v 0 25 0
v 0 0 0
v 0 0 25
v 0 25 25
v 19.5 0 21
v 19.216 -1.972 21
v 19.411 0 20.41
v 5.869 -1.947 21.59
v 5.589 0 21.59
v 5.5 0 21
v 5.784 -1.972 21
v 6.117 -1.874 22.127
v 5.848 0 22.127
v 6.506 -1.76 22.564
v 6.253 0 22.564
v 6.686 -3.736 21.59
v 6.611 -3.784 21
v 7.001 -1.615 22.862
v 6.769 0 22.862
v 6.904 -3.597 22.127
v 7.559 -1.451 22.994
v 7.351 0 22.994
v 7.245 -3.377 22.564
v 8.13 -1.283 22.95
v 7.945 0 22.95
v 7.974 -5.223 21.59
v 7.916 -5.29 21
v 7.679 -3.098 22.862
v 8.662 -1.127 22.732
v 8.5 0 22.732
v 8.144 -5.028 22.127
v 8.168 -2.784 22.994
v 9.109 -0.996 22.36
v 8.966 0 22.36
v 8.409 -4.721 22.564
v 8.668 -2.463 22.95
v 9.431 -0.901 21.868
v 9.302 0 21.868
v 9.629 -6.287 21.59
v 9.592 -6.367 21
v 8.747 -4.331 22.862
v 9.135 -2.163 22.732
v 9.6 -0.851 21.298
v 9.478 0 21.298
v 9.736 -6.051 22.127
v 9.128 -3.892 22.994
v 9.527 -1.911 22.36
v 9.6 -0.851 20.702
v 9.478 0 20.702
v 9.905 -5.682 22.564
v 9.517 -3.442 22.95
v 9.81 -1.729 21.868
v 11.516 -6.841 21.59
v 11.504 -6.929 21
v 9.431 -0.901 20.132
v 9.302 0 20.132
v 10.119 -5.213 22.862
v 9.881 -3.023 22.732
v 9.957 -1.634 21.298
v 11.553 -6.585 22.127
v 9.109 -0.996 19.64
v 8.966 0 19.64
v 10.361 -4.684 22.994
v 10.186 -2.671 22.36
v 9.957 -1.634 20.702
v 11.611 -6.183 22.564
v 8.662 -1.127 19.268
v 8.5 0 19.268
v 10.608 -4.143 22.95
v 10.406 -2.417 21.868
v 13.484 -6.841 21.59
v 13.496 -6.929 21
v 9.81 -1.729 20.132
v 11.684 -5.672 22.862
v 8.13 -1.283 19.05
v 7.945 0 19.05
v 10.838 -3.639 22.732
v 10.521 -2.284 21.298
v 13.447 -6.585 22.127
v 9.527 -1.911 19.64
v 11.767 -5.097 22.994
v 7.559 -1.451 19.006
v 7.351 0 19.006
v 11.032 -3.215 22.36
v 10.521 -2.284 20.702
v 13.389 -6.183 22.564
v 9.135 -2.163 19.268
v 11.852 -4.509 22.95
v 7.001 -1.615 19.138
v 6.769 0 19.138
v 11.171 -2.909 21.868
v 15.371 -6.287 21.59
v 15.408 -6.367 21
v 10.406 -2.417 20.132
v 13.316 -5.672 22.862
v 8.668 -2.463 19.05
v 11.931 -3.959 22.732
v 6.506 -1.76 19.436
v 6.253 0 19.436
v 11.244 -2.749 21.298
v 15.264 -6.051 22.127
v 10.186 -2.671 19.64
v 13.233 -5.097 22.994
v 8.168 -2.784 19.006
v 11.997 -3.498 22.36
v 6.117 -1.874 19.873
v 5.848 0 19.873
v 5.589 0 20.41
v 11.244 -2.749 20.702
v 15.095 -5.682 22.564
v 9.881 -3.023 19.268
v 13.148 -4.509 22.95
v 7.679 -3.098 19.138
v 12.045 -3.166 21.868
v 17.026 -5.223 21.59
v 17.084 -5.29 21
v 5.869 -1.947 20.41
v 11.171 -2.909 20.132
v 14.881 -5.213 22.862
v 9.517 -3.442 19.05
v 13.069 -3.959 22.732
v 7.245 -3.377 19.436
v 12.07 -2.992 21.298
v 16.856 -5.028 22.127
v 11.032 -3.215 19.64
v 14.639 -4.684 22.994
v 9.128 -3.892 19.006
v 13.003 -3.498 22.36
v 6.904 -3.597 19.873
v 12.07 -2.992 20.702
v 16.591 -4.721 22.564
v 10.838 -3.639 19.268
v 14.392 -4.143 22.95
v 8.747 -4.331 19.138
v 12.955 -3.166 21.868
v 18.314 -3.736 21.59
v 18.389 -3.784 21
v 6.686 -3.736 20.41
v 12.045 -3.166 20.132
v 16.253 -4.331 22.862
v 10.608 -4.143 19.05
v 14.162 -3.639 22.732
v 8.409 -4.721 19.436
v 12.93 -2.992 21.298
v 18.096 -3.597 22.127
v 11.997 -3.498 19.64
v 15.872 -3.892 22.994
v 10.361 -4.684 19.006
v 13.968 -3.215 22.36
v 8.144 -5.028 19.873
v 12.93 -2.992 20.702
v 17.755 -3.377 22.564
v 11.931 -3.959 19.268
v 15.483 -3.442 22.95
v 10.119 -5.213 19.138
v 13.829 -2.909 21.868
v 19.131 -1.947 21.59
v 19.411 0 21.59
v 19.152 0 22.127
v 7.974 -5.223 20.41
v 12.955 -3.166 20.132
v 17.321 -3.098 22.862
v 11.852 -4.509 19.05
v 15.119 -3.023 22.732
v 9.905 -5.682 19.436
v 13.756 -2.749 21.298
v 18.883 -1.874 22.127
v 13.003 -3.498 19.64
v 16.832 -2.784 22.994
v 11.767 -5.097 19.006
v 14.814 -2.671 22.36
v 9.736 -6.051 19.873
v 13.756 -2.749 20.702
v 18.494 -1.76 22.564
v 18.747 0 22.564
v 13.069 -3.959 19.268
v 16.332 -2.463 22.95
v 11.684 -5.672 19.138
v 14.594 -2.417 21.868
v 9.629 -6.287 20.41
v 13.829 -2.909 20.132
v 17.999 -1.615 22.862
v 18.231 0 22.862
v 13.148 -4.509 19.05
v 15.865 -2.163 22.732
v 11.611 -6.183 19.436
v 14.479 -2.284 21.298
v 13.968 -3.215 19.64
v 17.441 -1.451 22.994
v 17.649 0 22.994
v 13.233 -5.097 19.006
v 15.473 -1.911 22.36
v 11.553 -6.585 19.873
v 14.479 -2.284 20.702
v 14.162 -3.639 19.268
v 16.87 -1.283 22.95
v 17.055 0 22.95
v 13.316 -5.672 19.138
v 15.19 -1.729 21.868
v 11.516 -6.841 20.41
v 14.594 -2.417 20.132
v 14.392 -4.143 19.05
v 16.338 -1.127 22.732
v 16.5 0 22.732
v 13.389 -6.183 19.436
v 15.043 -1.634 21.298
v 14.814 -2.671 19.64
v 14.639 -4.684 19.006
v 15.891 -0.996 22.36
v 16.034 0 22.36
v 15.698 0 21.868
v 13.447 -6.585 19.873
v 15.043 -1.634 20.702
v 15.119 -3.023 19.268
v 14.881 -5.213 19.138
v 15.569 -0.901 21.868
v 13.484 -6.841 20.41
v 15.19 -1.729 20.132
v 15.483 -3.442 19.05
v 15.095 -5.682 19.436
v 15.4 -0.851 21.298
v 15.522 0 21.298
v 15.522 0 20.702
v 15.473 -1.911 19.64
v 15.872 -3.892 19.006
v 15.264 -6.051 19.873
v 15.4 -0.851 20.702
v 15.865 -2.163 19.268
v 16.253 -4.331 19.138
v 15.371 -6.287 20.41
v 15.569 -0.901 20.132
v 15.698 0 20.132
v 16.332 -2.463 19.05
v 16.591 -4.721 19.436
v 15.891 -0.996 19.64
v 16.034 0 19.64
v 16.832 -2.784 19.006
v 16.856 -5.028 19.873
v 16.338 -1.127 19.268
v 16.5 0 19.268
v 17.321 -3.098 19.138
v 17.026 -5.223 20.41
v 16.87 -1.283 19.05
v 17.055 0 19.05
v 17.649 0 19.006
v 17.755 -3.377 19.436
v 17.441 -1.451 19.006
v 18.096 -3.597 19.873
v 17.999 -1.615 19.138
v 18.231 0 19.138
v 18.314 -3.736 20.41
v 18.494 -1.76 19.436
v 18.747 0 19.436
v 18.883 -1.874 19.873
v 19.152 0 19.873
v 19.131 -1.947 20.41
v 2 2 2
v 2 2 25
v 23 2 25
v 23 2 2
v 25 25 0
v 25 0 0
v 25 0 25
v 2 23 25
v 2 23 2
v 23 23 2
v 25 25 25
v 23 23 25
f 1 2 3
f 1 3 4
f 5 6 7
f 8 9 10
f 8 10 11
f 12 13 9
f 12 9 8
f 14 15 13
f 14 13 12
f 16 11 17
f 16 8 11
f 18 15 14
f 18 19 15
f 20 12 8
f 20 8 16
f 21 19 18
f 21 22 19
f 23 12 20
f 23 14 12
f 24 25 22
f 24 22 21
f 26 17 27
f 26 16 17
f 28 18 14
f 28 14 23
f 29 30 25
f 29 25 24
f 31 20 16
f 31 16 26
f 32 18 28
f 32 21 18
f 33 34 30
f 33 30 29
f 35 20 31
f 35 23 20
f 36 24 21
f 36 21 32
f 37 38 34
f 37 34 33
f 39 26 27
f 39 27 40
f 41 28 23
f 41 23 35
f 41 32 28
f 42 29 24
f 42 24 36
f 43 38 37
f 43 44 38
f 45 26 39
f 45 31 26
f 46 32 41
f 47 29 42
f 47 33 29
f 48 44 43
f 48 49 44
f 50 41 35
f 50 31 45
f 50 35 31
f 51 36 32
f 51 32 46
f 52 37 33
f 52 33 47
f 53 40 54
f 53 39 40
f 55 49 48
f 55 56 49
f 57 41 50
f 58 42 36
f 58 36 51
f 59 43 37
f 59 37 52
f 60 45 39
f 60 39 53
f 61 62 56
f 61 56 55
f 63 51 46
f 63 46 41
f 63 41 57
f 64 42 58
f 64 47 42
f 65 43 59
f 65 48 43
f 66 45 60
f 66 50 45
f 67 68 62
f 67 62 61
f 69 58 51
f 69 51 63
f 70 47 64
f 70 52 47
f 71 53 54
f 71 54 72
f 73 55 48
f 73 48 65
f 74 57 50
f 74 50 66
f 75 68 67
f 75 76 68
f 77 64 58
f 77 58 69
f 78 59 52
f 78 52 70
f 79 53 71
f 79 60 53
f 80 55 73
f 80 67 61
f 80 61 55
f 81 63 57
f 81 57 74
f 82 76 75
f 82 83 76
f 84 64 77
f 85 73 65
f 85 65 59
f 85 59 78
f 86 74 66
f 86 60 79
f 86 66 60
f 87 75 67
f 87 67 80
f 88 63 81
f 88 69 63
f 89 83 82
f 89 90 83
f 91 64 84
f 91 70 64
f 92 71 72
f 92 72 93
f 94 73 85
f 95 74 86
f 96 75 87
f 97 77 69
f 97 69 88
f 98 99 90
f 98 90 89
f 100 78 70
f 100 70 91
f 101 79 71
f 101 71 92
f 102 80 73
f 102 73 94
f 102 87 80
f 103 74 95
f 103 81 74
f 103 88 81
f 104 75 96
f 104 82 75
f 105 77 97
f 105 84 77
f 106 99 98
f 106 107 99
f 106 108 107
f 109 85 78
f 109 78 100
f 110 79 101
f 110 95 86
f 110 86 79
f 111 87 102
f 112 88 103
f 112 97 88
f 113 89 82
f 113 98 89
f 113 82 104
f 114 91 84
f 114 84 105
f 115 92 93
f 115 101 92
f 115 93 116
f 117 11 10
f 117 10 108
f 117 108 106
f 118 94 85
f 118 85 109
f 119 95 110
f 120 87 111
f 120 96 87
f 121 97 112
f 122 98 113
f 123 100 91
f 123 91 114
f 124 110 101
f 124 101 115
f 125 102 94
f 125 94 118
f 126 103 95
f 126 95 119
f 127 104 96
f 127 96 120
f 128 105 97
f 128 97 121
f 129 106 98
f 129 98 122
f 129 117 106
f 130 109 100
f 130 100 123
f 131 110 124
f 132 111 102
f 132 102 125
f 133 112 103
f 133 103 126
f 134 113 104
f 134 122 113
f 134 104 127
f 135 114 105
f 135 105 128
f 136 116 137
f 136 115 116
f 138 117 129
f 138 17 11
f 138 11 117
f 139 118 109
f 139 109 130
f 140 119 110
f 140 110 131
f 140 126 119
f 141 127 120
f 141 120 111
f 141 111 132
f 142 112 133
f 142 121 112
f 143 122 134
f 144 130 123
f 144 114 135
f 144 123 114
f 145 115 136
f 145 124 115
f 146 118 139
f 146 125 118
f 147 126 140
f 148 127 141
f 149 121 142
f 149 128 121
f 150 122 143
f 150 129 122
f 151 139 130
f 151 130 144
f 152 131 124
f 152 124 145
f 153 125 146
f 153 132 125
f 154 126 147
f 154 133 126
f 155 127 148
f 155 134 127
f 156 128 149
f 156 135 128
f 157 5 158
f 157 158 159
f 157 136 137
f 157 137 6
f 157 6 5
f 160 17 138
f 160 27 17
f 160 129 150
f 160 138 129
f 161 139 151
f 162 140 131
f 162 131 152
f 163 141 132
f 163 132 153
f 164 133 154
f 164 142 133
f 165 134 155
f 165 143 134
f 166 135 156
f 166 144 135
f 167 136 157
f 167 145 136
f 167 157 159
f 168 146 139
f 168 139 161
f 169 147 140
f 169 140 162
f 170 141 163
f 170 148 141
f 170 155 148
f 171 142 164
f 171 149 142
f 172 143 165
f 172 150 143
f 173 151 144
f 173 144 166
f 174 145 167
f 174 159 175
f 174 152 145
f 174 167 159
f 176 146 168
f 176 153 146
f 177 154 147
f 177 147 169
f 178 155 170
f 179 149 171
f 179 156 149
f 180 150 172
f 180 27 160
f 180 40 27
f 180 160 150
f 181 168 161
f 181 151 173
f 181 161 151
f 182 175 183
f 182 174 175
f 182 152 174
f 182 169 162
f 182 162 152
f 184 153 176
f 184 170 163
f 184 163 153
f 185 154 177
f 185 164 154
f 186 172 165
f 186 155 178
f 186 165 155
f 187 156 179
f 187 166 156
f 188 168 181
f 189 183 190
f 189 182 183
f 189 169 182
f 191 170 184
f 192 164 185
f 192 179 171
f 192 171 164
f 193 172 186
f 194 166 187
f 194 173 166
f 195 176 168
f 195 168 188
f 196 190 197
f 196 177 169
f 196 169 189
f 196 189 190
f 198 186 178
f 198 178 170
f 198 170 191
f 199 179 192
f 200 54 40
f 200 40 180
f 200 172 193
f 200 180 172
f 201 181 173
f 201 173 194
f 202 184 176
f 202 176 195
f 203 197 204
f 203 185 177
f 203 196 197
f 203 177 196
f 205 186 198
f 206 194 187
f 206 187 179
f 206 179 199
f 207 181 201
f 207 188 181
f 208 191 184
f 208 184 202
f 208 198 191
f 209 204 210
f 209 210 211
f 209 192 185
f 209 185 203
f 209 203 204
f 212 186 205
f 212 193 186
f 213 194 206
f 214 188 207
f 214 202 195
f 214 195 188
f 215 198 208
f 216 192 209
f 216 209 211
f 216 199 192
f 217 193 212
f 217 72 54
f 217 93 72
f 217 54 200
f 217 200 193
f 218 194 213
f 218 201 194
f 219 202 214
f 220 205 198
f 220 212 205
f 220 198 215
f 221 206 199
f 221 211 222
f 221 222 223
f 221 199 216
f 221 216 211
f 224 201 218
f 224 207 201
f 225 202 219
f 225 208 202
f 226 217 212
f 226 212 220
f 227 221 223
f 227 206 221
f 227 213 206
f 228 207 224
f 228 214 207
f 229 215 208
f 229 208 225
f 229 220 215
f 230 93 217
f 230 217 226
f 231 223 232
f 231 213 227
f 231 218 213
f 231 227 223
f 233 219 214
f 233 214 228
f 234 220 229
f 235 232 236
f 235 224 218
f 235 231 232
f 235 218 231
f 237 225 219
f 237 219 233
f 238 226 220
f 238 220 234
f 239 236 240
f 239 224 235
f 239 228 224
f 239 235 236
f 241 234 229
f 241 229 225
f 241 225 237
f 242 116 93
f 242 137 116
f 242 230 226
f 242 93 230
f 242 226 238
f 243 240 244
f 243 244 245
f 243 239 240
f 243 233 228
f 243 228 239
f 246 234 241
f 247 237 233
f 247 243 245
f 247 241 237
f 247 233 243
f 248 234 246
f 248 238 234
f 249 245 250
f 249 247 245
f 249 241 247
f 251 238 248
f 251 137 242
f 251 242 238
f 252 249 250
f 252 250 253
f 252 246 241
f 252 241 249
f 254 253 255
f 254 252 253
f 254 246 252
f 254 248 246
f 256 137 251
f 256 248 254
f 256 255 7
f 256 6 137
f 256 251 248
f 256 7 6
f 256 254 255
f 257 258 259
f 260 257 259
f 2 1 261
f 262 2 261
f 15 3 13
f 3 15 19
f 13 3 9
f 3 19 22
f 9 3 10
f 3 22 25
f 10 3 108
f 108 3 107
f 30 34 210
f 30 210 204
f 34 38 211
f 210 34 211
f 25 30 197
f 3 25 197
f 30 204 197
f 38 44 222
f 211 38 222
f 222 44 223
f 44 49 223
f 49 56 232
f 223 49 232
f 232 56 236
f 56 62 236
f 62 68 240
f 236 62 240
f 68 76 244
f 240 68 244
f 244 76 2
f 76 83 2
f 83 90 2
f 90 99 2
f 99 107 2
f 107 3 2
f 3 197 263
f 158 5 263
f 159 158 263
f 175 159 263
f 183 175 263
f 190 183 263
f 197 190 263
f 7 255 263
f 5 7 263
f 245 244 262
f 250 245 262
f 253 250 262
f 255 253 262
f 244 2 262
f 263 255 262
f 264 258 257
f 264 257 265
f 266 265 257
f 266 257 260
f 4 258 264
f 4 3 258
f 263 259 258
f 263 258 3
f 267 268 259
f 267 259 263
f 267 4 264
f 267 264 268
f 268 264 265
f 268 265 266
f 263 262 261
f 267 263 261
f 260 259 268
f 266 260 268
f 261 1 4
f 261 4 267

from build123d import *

# Parameters (mm, degrees)
BOX001_W     = 21
BOX001_H     = 21
BOX001_DEPTH = 24
TORUS_R      = 2
BOX_W        = 25
BOX_H        = 25
BOX_DEPTH    = 25


with BuildPart() as cube001:
    # Box001 → Box001 (new body)
    with BuildSketch(Plane(origin=(2, 2, 2), x_dir=(1, 0, 0), z_dir=(0, 0, 1))):
        with Locations((10.5, 10.5)):
            Rectangle(BOX001_W, BOX001_H)
    extrude(amount=BOX001_DEPTH)


with BuildPart() as torus:
    # Torus → Torus (revolve)
    with BuildSketch(Plane(origin=(12.5, 0, 21), x_dir=(1, 0, 0), z_dir=(0, -1, 0))):
        with Locations((5, 0)):
            Circle(TORUS_R)
    revolve(axis=Axis((12.5, 0, 21), (0, 0, 1)))


with BuildPart() as cut:
    # Box → Box (new body)
    with BuildSketch(Plane.XY):
        with Locations((12.5, 12.5)):
            Rectangle(BOX_W, BOX_H)
    extrude(amount=BOX_DEPTH)

    # Fusion: union Torus
    add(torus.part)

    # Cut: cut Cube001
    add(cube001.part, mode=Mode.SUBTRACT)


solid = cut.part
